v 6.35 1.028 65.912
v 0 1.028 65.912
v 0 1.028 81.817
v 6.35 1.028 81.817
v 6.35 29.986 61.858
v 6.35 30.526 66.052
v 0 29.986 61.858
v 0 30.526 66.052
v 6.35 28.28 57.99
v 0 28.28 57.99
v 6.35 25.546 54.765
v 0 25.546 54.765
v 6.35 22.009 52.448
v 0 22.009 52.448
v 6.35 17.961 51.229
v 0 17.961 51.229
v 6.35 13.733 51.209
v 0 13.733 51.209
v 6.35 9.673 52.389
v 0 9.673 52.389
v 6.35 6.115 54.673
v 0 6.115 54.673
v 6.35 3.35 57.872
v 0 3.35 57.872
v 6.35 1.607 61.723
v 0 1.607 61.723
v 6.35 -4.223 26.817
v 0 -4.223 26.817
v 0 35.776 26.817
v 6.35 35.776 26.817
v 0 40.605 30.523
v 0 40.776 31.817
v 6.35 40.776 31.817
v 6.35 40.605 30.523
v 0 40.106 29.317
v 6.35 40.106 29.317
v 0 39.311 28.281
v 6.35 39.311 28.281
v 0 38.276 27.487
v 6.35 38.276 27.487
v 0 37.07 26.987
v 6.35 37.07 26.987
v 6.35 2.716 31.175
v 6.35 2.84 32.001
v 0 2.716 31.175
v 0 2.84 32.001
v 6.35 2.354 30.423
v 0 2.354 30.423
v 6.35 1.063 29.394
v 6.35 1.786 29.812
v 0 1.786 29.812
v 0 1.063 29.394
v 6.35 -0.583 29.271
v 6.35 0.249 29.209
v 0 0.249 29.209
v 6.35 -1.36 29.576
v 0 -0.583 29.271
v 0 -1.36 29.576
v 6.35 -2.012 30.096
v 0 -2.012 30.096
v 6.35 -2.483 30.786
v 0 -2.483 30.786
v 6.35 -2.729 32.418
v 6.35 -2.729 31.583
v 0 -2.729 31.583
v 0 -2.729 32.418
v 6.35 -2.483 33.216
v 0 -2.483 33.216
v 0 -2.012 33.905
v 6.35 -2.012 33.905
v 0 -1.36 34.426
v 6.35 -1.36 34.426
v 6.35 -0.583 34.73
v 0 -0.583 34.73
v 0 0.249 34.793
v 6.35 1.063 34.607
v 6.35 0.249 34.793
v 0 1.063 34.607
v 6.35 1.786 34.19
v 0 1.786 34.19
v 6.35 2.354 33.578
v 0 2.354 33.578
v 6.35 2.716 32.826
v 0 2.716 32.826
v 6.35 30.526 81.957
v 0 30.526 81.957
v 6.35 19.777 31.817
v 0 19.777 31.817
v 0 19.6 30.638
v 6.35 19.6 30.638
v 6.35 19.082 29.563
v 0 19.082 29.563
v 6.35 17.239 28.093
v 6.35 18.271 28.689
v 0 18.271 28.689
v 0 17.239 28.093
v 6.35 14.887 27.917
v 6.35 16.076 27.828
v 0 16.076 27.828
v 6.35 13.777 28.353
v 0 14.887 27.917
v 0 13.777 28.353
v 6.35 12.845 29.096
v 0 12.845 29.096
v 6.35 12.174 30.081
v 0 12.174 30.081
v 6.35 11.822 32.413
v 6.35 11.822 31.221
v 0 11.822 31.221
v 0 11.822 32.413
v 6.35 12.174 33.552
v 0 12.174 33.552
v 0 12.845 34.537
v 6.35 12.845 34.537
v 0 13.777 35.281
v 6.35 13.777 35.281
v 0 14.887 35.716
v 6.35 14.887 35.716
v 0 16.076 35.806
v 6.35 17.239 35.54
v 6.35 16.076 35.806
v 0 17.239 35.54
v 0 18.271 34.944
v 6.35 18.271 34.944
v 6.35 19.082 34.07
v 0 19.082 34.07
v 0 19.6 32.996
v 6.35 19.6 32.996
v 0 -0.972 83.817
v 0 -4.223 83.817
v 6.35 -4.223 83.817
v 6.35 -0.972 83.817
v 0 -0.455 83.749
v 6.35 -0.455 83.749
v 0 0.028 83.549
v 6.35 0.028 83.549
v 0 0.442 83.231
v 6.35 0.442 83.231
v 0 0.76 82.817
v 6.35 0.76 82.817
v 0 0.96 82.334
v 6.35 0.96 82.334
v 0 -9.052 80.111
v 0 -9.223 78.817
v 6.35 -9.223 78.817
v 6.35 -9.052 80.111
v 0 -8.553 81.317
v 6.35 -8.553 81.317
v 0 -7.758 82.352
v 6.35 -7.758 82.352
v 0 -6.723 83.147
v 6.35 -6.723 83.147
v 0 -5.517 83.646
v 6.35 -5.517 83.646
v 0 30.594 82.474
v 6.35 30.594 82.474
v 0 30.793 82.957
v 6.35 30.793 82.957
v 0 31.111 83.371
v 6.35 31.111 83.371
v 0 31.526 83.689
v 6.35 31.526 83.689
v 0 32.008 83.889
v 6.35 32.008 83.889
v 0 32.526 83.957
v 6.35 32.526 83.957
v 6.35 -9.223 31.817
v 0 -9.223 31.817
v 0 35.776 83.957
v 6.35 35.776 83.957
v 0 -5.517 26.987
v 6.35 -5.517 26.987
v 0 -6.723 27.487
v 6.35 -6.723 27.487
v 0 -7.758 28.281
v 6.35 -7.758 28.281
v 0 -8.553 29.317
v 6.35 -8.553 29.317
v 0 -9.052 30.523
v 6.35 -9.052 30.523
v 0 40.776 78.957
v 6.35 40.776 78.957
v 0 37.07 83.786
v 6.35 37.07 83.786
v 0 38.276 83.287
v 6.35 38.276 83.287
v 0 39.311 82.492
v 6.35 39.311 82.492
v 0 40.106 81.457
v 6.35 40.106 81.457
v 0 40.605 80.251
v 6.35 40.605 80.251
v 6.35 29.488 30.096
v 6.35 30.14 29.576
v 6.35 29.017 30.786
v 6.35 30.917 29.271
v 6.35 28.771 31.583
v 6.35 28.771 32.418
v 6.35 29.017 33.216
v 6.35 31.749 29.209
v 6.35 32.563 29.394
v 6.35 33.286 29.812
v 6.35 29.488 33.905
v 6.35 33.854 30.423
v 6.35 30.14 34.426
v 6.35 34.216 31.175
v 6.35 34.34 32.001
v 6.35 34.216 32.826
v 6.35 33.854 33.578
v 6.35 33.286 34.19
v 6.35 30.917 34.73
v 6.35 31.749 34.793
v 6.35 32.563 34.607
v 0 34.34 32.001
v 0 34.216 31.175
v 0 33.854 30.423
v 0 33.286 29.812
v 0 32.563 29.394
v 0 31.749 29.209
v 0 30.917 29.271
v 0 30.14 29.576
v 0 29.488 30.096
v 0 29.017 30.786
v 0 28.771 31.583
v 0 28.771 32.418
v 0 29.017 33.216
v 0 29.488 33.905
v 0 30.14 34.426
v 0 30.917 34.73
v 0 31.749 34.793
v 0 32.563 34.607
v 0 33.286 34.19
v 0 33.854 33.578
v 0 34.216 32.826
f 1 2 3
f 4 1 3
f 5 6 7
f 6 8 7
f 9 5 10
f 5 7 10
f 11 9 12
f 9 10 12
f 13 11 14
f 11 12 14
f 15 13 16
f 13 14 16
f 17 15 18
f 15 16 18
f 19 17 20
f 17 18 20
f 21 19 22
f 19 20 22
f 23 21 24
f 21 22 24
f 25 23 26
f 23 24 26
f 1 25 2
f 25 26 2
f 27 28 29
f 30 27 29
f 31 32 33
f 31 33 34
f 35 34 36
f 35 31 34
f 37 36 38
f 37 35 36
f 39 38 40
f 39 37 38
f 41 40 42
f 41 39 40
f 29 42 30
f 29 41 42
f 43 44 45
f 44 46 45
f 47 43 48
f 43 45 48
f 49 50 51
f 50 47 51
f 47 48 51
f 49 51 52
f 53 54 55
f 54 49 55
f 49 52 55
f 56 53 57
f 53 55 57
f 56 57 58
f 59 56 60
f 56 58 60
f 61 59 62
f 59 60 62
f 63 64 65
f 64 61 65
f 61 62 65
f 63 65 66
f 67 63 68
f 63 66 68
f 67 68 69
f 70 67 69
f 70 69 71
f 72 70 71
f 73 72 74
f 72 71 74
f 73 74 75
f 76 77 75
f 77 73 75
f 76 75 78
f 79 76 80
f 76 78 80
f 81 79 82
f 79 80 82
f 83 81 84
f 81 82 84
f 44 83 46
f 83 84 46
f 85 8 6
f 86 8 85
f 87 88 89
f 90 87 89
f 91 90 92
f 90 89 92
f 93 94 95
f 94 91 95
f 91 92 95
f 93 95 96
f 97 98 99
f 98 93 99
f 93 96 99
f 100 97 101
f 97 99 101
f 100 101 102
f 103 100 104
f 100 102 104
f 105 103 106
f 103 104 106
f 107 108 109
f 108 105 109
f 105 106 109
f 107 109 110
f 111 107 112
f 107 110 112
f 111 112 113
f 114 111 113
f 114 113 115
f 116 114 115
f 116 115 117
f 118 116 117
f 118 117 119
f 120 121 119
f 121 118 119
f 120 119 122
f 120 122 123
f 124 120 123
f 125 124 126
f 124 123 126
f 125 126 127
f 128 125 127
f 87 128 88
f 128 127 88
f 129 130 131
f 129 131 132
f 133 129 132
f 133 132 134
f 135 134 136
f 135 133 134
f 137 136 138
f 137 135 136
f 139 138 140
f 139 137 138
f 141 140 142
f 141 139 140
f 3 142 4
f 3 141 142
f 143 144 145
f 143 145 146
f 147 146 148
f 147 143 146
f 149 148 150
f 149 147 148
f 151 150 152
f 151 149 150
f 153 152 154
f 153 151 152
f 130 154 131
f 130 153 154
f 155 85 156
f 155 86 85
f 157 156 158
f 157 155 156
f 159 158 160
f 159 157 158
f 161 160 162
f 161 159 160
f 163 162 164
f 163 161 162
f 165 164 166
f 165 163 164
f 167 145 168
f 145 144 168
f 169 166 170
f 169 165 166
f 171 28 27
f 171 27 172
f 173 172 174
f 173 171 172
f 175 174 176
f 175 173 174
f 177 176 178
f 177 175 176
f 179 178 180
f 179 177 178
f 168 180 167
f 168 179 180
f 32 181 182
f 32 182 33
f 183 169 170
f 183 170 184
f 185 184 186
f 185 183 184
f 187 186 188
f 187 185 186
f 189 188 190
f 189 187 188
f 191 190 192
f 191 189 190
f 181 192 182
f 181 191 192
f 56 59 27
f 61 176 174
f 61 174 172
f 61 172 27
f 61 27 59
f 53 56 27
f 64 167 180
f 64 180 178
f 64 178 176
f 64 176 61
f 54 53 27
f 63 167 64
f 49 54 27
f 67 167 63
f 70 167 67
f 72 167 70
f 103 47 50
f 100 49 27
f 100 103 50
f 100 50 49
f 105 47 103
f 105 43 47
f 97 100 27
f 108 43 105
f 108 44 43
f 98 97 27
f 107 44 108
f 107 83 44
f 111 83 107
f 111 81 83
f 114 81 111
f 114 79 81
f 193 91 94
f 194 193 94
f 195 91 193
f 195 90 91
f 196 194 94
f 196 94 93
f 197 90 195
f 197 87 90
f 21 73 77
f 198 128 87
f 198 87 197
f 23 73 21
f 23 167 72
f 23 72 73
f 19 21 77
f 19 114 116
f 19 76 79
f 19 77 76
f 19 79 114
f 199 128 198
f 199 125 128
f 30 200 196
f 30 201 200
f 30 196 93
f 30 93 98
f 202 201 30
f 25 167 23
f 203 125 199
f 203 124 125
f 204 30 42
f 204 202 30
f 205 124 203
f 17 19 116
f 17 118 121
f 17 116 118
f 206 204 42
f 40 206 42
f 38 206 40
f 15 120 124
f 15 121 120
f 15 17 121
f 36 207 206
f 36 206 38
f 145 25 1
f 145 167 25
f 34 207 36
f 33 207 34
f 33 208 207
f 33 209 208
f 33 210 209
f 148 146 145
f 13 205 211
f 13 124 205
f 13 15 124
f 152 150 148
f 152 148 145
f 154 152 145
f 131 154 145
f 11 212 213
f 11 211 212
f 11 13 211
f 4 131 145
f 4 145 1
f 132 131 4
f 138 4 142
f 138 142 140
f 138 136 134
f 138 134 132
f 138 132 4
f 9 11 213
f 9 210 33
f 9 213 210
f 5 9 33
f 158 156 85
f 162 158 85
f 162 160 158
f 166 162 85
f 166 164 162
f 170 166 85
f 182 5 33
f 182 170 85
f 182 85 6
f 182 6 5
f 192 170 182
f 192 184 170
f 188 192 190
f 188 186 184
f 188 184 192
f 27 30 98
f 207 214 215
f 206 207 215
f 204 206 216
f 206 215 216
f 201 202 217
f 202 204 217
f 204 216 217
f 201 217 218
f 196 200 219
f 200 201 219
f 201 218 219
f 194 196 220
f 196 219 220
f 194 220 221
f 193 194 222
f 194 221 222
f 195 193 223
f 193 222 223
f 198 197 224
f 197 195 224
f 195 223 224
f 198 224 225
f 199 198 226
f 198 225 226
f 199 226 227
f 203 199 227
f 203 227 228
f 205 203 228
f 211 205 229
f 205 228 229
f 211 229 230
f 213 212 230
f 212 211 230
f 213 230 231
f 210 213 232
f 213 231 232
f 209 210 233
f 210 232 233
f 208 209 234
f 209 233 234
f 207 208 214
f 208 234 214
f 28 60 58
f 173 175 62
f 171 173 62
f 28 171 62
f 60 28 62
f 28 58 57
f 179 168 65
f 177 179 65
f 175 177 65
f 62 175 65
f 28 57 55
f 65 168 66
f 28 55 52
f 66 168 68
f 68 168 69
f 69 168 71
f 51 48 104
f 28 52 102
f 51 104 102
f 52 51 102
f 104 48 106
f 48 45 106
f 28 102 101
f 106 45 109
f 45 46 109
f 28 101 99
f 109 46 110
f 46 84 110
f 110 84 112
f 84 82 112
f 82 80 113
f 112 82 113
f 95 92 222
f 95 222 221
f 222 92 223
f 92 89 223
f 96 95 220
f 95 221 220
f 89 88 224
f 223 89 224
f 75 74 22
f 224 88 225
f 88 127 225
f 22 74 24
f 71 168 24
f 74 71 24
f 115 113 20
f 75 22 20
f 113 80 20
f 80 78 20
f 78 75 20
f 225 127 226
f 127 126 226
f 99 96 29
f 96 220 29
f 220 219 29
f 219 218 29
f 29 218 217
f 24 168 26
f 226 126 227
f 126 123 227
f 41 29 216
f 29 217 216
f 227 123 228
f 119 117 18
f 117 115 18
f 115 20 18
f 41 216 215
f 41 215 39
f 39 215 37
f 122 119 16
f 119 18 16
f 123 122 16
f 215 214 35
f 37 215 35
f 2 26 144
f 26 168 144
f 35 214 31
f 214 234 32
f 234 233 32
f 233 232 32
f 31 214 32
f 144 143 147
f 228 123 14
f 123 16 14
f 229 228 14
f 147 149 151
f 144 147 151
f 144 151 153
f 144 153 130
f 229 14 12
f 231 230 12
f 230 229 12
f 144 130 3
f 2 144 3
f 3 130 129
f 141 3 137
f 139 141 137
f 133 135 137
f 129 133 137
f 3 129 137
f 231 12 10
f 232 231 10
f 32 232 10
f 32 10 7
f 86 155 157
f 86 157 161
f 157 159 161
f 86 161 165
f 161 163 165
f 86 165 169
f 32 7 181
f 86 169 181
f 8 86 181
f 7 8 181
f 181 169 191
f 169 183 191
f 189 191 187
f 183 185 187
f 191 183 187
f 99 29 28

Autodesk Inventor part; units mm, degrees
ref_plane "YZ Plane" through (0, 0, 0) normal (1, 0, 0) x (0, 1, 0)
ref_plane "XZ Plane" through (0, 0, 0) normal (0, 1, 0) x (-1, 0, 0)
ref_plane "XY Plane" through (0, 0, 0) normal (0, 0, 1) x (1, 0, 0)
sketch "Sketch1" plane through (0, 0, 0) normal (1, 0, 0) x (0, 1, 0)
  arc A0 (1.0277, 65.9115) -> (30.5255, 66.0516) centre (15.7774, 65.8167) ccw
  line L0 (30.5255, 66.0516) -> (30.5255, 81.9568)
  line L1 (40.7755, 78.9568) -> (40.7755, 31.8167)
  circle A1 centre (15.7774, 31.8167) radius 4
  line L2 (-9.2226, 78.8167) -> (-9.2226, 31.8167)
  line L3 (1.0277, 65.9115) -> (1.0277, 81.8167)
  line L4 (-4.2226, 83.8167) -> (-0.9723, 83.8167)
  line L5 (32.5255, 83.9568) -> (35.7755, 83.9568)
  circle A2 centre (0.0401, 32.0007) radius 2.8
  circle A3 centre (31.5401, 32.0007) radius 2.8
  line L6 (15.7774, 31.8167) -> (15.7774, 44.8985) construction
  arc A4 (40.7755, 78.9568) -> (35.7755, 83.9568) centre (35.7755, 78.9568) ccw
  arc A5 (-4.2226, 83.8167) -> (-9.2226, 78.8167) centre (-4.2226, 78.8167) ccw
  line L7 (-4.2226, 26.8167) -> (35.7755, 26.8167)
  arc A6 (-9.2226, 31.8167) -> (-4.2226, 26.8167) centre (-4.2226, 31.8167) ccw
  arc A7 (35.7755, 26.8167) -> (40.7755, 31.8167) centre (35.7755, 31.8167) ccw
  arc A8 (32.5255, 83.9568) -> (30.5255, 81.9568) centre (32.5255, 81.9568) ccw
  arc A9 (1.0277, 81.8167) -> (-0.9723, 83.8167) centre (-0.9723, 81.8167) ccw
  point P0 (-9.2226, 83.8167)
  point P1 (30.5255, 83.9568)
  point P2 (40.7755, 83.9568)
  point P3 (1.0277, 83.8167)
  dimension "d21" = 29.5
  dimension "d44" = 8
  dimension "d57" = 25
  dimension "d64" = 5.6
  dimension "d74" = 18
  dimension "d76" = 5
  dimension "d79" = 2
extrude "Extrusion2" add sketch "Sketch1" along normal blind 6.35
properties part number "motor mount"
